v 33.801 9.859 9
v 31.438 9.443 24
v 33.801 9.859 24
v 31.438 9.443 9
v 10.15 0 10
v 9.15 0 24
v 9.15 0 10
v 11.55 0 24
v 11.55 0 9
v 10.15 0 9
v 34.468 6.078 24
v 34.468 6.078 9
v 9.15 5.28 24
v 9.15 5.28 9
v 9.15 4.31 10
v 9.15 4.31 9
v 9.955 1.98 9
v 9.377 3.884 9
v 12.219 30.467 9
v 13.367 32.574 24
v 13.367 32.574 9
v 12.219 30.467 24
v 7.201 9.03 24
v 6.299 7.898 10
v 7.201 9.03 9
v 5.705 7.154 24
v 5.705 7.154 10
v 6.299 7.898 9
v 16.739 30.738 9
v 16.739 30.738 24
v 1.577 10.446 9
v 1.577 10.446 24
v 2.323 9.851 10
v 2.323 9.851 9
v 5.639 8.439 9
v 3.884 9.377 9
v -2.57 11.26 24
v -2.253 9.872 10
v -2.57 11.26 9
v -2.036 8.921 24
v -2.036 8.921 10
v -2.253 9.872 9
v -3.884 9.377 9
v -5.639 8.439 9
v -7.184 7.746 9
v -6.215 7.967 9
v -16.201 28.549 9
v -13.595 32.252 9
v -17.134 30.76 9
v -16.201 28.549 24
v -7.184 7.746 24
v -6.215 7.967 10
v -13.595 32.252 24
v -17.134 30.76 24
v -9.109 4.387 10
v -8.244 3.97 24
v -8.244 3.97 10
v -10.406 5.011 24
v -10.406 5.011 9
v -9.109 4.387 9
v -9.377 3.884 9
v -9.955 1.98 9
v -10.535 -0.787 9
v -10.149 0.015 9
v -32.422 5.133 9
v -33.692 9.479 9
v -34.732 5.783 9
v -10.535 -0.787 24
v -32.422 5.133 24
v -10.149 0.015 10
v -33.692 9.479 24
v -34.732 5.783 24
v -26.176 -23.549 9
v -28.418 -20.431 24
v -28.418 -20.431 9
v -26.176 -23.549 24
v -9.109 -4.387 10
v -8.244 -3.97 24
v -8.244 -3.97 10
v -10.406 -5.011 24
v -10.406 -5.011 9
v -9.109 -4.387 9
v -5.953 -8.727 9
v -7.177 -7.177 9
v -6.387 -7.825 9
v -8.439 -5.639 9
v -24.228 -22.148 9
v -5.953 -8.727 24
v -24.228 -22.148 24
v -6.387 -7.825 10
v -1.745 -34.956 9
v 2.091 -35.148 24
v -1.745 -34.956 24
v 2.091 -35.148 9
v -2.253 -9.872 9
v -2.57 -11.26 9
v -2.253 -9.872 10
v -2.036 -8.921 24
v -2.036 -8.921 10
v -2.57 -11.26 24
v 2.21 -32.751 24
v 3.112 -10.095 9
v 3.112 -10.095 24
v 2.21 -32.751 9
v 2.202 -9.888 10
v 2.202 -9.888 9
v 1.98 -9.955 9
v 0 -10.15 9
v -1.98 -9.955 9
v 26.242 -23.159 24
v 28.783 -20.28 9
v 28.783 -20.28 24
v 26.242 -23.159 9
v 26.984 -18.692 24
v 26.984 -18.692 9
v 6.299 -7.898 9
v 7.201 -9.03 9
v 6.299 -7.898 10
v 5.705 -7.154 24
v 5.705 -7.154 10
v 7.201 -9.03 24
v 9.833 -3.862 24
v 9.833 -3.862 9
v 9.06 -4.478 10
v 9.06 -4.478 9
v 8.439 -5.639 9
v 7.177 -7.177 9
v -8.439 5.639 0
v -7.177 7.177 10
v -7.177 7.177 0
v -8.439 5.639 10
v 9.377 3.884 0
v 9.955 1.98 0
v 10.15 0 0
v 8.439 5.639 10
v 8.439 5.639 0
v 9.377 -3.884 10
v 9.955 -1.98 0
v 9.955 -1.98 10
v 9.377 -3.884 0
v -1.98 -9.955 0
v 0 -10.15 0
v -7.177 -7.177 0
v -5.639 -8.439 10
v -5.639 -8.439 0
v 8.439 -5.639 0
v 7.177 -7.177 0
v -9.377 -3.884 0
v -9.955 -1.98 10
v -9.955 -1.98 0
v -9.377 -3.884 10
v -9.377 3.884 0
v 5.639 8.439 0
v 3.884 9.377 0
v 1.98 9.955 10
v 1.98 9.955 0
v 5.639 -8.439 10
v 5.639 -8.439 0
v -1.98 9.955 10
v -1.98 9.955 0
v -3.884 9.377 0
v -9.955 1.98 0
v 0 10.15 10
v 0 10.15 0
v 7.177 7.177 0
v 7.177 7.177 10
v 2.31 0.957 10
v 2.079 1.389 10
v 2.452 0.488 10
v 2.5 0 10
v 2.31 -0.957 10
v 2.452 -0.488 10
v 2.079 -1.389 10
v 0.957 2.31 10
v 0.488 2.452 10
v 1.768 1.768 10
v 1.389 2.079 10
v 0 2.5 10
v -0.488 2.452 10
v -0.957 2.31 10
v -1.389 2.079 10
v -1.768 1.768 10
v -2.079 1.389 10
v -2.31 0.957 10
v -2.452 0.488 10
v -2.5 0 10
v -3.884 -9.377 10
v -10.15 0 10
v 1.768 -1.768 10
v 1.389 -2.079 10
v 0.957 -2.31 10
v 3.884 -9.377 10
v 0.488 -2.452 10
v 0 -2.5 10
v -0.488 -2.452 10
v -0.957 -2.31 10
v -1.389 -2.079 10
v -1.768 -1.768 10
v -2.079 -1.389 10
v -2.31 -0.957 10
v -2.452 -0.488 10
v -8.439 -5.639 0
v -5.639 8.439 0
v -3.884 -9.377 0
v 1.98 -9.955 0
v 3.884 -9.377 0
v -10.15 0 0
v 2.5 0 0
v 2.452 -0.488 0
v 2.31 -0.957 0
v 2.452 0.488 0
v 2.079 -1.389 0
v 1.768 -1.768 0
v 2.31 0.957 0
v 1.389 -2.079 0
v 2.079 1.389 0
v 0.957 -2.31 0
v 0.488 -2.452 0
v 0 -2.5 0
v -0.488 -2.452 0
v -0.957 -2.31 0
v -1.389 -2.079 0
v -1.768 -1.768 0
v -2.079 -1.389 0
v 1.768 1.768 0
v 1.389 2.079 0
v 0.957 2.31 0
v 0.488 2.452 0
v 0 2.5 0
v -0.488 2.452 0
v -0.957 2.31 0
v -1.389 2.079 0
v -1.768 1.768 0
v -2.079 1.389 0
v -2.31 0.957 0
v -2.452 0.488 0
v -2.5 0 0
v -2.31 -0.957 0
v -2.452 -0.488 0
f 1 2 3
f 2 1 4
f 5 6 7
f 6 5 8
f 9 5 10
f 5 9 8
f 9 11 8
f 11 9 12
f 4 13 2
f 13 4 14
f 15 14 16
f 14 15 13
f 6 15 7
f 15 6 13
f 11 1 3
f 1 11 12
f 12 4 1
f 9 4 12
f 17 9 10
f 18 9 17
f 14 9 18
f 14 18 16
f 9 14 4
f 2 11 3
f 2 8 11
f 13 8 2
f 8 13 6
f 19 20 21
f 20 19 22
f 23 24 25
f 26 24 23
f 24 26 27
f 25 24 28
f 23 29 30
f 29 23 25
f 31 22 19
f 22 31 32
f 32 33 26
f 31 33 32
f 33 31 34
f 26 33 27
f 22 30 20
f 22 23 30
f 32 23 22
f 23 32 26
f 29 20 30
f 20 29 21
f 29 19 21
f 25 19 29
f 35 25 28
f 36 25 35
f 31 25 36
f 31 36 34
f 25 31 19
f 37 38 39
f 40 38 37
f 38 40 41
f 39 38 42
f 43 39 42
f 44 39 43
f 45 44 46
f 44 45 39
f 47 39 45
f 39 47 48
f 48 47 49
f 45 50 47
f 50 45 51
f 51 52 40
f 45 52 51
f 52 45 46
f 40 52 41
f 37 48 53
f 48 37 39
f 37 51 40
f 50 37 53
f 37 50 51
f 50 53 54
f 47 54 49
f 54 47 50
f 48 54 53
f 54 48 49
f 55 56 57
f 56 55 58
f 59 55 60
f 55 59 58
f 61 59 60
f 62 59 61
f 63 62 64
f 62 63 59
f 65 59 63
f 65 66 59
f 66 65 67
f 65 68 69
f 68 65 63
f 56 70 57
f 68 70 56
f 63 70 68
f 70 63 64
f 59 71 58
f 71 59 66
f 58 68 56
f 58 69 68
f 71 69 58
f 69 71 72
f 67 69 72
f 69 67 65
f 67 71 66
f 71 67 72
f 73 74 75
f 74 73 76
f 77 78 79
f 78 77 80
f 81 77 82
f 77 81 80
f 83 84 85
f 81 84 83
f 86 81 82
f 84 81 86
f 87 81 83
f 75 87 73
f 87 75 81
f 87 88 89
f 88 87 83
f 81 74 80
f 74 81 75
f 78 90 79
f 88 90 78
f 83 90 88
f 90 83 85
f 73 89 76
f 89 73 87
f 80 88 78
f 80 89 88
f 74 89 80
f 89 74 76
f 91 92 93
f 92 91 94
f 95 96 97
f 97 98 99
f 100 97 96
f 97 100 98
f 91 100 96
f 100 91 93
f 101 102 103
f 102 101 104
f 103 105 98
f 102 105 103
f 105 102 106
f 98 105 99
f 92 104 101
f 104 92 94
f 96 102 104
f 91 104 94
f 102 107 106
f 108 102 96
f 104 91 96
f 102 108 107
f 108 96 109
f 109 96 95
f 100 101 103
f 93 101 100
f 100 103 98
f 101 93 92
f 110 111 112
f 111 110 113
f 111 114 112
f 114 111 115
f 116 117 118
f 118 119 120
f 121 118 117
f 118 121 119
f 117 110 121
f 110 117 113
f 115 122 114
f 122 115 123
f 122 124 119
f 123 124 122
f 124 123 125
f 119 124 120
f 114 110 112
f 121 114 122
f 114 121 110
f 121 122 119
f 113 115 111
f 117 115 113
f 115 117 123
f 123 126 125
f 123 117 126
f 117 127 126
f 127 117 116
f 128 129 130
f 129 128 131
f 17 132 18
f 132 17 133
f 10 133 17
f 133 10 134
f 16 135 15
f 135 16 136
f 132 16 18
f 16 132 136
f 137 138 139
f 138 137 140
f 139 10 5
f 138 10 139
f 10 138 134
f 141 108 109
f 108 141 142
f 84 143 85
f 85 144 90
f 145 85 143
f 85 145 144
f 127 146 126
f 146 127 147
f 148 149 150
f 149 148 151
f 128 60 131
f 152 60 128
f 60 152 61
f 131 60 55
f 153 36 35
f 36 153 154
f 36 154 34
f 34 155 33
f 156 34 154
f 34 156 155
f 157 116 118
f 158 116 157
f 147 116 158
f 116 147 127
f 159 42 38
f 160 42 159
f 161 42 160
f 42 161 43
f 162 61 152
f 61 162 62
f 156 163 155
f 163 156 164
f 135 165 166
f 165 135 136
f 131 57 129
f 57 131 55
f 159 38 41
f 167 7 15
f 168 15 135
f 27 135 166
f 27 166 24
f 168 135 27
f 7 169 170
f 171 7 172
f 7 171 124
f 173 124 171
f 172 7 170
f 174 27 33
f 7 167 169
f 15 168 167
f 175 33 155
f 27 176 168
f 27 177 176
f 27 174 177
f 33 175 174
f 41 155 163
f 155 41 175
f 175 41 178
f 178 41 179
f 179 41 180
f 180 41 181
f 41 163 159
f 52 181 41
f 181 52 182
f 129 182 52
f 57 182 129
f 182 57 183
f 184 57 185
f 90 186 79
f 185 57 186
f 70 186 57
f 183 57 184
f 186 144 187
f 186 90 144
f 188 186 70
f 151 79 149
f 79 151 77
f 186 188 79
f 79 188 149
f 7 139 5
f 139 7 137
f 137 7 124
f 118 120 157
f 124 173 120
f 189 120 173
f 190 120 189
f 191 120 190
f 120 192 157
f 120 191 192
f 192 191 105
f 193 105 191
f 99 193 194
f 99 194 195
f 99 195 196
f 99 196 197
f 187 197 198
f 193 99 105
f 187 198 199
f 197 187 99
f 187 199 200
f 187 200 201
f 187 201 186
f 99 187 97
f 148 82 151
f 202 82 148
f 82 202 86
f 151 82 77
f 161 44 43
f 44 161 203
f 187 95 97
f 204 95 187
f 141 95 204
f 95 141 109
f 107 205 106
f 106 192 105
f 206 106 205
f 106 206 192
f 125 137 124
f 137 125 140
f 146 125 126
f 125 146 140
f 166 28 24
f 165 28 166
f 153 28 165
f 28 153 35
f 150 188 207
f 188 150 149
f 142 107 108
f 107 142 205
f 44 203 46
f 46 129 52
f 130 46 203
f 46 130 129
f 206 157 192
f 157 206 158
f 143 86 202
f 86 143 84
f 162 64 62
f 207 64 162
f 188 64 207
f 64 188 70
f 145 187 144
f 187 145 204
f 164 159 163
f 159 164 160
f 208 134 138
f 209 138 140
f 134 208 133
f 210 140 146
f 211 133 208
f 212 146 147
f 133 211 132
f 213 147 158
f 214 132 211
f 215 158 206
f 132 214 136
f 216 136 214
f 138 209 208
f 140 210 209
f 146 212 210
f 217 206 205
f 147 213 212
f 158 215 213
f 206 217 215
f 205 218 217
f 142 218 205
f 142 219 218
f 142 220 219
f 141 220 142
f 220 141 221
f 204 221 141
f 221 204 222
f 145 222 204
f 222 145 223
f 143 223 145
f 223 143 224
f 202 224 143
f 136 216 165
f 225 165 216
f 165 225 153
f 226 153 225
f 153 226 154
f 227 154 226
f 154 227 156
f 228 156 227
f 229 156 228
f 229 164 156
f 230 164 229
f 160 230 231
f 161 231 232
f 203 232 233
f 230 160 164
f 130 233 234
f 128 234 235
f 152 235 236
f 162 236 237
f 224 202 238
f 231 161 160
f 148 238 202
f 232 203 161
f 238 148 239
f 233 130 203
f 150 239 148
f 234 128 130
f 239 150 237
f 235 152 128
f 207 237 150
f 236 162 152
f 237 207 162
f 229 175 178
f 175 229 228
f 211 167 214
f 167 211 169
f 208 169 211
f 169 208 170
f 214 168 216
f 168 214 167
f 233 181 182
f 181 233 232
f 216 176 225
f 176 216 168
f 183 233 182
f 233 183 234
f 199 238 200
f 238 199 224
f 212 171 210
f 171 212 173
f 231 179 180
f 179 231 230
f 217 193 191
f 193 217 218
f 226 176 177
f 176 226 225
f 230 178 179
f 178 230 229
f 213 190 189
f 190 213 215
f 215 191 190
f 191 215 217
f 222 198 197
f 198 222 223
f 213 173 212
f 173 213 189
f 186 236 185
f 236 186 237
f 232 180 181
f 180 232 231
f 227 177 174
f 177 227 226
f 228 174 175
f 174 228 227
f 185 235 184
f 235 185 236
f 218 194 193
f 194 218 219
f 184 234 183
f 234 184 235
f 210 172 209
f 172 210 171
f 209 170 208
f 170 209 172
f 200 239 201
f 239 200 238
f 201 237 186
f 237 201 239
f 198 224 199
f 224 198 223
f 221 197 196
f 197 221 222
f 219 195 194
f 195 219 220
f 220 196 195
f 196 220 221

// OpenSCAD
$fn = 32;

// ----------------------------------------------------------------------
// Impeller: 70 mm, 7 blades, 24 mm tall
// ----------------------------------------------------------------------

// --- parameters (mm) ---
center_d = 20.3;          // hub diameter
center_h = 10;            // hub height
wheel_d = 70;             // outer diameter over the blades
blade_count = 7;          // number of blades
blade_t = 2.4;            // blade thickness
blade_h = 14;             // blade height
blade_in_r = 9.15;        // blade root radius
blade_out_r = 32.6;       // blade tip radius
sweep = 10;               // blade sweep, degrees
bore_d = 5;               // shaft bore

module hub() {
  cylinder(h = center_h, d = center_d);
}

module blade() {
  /* blade swept between two boxes: hull of the root and the tip section */
  hull() {
    translate([blade_in_r, 0, center_h - 1])
      cube([blade_t, blade_t * 2.2, blade_h + 1], center = false);
    rotate([0, 0, sweep])
      translate([blade_out_r, 0, center_h - 1])
        cube([blade_t, blade_t * 1.6, blade_h + 1], center = false);
  }
}

module blades() {
  for (i = [0 : blade_count - 1])
    rotate([0, 0, i * 360 / blade_count]) blade();
}

difference() {
  union() {
    hub();
    blades();
  }
  translate([0, 0, -1]) cylinder(h = center_h + blade_h + 0 + 3, d = bore_d);
}
